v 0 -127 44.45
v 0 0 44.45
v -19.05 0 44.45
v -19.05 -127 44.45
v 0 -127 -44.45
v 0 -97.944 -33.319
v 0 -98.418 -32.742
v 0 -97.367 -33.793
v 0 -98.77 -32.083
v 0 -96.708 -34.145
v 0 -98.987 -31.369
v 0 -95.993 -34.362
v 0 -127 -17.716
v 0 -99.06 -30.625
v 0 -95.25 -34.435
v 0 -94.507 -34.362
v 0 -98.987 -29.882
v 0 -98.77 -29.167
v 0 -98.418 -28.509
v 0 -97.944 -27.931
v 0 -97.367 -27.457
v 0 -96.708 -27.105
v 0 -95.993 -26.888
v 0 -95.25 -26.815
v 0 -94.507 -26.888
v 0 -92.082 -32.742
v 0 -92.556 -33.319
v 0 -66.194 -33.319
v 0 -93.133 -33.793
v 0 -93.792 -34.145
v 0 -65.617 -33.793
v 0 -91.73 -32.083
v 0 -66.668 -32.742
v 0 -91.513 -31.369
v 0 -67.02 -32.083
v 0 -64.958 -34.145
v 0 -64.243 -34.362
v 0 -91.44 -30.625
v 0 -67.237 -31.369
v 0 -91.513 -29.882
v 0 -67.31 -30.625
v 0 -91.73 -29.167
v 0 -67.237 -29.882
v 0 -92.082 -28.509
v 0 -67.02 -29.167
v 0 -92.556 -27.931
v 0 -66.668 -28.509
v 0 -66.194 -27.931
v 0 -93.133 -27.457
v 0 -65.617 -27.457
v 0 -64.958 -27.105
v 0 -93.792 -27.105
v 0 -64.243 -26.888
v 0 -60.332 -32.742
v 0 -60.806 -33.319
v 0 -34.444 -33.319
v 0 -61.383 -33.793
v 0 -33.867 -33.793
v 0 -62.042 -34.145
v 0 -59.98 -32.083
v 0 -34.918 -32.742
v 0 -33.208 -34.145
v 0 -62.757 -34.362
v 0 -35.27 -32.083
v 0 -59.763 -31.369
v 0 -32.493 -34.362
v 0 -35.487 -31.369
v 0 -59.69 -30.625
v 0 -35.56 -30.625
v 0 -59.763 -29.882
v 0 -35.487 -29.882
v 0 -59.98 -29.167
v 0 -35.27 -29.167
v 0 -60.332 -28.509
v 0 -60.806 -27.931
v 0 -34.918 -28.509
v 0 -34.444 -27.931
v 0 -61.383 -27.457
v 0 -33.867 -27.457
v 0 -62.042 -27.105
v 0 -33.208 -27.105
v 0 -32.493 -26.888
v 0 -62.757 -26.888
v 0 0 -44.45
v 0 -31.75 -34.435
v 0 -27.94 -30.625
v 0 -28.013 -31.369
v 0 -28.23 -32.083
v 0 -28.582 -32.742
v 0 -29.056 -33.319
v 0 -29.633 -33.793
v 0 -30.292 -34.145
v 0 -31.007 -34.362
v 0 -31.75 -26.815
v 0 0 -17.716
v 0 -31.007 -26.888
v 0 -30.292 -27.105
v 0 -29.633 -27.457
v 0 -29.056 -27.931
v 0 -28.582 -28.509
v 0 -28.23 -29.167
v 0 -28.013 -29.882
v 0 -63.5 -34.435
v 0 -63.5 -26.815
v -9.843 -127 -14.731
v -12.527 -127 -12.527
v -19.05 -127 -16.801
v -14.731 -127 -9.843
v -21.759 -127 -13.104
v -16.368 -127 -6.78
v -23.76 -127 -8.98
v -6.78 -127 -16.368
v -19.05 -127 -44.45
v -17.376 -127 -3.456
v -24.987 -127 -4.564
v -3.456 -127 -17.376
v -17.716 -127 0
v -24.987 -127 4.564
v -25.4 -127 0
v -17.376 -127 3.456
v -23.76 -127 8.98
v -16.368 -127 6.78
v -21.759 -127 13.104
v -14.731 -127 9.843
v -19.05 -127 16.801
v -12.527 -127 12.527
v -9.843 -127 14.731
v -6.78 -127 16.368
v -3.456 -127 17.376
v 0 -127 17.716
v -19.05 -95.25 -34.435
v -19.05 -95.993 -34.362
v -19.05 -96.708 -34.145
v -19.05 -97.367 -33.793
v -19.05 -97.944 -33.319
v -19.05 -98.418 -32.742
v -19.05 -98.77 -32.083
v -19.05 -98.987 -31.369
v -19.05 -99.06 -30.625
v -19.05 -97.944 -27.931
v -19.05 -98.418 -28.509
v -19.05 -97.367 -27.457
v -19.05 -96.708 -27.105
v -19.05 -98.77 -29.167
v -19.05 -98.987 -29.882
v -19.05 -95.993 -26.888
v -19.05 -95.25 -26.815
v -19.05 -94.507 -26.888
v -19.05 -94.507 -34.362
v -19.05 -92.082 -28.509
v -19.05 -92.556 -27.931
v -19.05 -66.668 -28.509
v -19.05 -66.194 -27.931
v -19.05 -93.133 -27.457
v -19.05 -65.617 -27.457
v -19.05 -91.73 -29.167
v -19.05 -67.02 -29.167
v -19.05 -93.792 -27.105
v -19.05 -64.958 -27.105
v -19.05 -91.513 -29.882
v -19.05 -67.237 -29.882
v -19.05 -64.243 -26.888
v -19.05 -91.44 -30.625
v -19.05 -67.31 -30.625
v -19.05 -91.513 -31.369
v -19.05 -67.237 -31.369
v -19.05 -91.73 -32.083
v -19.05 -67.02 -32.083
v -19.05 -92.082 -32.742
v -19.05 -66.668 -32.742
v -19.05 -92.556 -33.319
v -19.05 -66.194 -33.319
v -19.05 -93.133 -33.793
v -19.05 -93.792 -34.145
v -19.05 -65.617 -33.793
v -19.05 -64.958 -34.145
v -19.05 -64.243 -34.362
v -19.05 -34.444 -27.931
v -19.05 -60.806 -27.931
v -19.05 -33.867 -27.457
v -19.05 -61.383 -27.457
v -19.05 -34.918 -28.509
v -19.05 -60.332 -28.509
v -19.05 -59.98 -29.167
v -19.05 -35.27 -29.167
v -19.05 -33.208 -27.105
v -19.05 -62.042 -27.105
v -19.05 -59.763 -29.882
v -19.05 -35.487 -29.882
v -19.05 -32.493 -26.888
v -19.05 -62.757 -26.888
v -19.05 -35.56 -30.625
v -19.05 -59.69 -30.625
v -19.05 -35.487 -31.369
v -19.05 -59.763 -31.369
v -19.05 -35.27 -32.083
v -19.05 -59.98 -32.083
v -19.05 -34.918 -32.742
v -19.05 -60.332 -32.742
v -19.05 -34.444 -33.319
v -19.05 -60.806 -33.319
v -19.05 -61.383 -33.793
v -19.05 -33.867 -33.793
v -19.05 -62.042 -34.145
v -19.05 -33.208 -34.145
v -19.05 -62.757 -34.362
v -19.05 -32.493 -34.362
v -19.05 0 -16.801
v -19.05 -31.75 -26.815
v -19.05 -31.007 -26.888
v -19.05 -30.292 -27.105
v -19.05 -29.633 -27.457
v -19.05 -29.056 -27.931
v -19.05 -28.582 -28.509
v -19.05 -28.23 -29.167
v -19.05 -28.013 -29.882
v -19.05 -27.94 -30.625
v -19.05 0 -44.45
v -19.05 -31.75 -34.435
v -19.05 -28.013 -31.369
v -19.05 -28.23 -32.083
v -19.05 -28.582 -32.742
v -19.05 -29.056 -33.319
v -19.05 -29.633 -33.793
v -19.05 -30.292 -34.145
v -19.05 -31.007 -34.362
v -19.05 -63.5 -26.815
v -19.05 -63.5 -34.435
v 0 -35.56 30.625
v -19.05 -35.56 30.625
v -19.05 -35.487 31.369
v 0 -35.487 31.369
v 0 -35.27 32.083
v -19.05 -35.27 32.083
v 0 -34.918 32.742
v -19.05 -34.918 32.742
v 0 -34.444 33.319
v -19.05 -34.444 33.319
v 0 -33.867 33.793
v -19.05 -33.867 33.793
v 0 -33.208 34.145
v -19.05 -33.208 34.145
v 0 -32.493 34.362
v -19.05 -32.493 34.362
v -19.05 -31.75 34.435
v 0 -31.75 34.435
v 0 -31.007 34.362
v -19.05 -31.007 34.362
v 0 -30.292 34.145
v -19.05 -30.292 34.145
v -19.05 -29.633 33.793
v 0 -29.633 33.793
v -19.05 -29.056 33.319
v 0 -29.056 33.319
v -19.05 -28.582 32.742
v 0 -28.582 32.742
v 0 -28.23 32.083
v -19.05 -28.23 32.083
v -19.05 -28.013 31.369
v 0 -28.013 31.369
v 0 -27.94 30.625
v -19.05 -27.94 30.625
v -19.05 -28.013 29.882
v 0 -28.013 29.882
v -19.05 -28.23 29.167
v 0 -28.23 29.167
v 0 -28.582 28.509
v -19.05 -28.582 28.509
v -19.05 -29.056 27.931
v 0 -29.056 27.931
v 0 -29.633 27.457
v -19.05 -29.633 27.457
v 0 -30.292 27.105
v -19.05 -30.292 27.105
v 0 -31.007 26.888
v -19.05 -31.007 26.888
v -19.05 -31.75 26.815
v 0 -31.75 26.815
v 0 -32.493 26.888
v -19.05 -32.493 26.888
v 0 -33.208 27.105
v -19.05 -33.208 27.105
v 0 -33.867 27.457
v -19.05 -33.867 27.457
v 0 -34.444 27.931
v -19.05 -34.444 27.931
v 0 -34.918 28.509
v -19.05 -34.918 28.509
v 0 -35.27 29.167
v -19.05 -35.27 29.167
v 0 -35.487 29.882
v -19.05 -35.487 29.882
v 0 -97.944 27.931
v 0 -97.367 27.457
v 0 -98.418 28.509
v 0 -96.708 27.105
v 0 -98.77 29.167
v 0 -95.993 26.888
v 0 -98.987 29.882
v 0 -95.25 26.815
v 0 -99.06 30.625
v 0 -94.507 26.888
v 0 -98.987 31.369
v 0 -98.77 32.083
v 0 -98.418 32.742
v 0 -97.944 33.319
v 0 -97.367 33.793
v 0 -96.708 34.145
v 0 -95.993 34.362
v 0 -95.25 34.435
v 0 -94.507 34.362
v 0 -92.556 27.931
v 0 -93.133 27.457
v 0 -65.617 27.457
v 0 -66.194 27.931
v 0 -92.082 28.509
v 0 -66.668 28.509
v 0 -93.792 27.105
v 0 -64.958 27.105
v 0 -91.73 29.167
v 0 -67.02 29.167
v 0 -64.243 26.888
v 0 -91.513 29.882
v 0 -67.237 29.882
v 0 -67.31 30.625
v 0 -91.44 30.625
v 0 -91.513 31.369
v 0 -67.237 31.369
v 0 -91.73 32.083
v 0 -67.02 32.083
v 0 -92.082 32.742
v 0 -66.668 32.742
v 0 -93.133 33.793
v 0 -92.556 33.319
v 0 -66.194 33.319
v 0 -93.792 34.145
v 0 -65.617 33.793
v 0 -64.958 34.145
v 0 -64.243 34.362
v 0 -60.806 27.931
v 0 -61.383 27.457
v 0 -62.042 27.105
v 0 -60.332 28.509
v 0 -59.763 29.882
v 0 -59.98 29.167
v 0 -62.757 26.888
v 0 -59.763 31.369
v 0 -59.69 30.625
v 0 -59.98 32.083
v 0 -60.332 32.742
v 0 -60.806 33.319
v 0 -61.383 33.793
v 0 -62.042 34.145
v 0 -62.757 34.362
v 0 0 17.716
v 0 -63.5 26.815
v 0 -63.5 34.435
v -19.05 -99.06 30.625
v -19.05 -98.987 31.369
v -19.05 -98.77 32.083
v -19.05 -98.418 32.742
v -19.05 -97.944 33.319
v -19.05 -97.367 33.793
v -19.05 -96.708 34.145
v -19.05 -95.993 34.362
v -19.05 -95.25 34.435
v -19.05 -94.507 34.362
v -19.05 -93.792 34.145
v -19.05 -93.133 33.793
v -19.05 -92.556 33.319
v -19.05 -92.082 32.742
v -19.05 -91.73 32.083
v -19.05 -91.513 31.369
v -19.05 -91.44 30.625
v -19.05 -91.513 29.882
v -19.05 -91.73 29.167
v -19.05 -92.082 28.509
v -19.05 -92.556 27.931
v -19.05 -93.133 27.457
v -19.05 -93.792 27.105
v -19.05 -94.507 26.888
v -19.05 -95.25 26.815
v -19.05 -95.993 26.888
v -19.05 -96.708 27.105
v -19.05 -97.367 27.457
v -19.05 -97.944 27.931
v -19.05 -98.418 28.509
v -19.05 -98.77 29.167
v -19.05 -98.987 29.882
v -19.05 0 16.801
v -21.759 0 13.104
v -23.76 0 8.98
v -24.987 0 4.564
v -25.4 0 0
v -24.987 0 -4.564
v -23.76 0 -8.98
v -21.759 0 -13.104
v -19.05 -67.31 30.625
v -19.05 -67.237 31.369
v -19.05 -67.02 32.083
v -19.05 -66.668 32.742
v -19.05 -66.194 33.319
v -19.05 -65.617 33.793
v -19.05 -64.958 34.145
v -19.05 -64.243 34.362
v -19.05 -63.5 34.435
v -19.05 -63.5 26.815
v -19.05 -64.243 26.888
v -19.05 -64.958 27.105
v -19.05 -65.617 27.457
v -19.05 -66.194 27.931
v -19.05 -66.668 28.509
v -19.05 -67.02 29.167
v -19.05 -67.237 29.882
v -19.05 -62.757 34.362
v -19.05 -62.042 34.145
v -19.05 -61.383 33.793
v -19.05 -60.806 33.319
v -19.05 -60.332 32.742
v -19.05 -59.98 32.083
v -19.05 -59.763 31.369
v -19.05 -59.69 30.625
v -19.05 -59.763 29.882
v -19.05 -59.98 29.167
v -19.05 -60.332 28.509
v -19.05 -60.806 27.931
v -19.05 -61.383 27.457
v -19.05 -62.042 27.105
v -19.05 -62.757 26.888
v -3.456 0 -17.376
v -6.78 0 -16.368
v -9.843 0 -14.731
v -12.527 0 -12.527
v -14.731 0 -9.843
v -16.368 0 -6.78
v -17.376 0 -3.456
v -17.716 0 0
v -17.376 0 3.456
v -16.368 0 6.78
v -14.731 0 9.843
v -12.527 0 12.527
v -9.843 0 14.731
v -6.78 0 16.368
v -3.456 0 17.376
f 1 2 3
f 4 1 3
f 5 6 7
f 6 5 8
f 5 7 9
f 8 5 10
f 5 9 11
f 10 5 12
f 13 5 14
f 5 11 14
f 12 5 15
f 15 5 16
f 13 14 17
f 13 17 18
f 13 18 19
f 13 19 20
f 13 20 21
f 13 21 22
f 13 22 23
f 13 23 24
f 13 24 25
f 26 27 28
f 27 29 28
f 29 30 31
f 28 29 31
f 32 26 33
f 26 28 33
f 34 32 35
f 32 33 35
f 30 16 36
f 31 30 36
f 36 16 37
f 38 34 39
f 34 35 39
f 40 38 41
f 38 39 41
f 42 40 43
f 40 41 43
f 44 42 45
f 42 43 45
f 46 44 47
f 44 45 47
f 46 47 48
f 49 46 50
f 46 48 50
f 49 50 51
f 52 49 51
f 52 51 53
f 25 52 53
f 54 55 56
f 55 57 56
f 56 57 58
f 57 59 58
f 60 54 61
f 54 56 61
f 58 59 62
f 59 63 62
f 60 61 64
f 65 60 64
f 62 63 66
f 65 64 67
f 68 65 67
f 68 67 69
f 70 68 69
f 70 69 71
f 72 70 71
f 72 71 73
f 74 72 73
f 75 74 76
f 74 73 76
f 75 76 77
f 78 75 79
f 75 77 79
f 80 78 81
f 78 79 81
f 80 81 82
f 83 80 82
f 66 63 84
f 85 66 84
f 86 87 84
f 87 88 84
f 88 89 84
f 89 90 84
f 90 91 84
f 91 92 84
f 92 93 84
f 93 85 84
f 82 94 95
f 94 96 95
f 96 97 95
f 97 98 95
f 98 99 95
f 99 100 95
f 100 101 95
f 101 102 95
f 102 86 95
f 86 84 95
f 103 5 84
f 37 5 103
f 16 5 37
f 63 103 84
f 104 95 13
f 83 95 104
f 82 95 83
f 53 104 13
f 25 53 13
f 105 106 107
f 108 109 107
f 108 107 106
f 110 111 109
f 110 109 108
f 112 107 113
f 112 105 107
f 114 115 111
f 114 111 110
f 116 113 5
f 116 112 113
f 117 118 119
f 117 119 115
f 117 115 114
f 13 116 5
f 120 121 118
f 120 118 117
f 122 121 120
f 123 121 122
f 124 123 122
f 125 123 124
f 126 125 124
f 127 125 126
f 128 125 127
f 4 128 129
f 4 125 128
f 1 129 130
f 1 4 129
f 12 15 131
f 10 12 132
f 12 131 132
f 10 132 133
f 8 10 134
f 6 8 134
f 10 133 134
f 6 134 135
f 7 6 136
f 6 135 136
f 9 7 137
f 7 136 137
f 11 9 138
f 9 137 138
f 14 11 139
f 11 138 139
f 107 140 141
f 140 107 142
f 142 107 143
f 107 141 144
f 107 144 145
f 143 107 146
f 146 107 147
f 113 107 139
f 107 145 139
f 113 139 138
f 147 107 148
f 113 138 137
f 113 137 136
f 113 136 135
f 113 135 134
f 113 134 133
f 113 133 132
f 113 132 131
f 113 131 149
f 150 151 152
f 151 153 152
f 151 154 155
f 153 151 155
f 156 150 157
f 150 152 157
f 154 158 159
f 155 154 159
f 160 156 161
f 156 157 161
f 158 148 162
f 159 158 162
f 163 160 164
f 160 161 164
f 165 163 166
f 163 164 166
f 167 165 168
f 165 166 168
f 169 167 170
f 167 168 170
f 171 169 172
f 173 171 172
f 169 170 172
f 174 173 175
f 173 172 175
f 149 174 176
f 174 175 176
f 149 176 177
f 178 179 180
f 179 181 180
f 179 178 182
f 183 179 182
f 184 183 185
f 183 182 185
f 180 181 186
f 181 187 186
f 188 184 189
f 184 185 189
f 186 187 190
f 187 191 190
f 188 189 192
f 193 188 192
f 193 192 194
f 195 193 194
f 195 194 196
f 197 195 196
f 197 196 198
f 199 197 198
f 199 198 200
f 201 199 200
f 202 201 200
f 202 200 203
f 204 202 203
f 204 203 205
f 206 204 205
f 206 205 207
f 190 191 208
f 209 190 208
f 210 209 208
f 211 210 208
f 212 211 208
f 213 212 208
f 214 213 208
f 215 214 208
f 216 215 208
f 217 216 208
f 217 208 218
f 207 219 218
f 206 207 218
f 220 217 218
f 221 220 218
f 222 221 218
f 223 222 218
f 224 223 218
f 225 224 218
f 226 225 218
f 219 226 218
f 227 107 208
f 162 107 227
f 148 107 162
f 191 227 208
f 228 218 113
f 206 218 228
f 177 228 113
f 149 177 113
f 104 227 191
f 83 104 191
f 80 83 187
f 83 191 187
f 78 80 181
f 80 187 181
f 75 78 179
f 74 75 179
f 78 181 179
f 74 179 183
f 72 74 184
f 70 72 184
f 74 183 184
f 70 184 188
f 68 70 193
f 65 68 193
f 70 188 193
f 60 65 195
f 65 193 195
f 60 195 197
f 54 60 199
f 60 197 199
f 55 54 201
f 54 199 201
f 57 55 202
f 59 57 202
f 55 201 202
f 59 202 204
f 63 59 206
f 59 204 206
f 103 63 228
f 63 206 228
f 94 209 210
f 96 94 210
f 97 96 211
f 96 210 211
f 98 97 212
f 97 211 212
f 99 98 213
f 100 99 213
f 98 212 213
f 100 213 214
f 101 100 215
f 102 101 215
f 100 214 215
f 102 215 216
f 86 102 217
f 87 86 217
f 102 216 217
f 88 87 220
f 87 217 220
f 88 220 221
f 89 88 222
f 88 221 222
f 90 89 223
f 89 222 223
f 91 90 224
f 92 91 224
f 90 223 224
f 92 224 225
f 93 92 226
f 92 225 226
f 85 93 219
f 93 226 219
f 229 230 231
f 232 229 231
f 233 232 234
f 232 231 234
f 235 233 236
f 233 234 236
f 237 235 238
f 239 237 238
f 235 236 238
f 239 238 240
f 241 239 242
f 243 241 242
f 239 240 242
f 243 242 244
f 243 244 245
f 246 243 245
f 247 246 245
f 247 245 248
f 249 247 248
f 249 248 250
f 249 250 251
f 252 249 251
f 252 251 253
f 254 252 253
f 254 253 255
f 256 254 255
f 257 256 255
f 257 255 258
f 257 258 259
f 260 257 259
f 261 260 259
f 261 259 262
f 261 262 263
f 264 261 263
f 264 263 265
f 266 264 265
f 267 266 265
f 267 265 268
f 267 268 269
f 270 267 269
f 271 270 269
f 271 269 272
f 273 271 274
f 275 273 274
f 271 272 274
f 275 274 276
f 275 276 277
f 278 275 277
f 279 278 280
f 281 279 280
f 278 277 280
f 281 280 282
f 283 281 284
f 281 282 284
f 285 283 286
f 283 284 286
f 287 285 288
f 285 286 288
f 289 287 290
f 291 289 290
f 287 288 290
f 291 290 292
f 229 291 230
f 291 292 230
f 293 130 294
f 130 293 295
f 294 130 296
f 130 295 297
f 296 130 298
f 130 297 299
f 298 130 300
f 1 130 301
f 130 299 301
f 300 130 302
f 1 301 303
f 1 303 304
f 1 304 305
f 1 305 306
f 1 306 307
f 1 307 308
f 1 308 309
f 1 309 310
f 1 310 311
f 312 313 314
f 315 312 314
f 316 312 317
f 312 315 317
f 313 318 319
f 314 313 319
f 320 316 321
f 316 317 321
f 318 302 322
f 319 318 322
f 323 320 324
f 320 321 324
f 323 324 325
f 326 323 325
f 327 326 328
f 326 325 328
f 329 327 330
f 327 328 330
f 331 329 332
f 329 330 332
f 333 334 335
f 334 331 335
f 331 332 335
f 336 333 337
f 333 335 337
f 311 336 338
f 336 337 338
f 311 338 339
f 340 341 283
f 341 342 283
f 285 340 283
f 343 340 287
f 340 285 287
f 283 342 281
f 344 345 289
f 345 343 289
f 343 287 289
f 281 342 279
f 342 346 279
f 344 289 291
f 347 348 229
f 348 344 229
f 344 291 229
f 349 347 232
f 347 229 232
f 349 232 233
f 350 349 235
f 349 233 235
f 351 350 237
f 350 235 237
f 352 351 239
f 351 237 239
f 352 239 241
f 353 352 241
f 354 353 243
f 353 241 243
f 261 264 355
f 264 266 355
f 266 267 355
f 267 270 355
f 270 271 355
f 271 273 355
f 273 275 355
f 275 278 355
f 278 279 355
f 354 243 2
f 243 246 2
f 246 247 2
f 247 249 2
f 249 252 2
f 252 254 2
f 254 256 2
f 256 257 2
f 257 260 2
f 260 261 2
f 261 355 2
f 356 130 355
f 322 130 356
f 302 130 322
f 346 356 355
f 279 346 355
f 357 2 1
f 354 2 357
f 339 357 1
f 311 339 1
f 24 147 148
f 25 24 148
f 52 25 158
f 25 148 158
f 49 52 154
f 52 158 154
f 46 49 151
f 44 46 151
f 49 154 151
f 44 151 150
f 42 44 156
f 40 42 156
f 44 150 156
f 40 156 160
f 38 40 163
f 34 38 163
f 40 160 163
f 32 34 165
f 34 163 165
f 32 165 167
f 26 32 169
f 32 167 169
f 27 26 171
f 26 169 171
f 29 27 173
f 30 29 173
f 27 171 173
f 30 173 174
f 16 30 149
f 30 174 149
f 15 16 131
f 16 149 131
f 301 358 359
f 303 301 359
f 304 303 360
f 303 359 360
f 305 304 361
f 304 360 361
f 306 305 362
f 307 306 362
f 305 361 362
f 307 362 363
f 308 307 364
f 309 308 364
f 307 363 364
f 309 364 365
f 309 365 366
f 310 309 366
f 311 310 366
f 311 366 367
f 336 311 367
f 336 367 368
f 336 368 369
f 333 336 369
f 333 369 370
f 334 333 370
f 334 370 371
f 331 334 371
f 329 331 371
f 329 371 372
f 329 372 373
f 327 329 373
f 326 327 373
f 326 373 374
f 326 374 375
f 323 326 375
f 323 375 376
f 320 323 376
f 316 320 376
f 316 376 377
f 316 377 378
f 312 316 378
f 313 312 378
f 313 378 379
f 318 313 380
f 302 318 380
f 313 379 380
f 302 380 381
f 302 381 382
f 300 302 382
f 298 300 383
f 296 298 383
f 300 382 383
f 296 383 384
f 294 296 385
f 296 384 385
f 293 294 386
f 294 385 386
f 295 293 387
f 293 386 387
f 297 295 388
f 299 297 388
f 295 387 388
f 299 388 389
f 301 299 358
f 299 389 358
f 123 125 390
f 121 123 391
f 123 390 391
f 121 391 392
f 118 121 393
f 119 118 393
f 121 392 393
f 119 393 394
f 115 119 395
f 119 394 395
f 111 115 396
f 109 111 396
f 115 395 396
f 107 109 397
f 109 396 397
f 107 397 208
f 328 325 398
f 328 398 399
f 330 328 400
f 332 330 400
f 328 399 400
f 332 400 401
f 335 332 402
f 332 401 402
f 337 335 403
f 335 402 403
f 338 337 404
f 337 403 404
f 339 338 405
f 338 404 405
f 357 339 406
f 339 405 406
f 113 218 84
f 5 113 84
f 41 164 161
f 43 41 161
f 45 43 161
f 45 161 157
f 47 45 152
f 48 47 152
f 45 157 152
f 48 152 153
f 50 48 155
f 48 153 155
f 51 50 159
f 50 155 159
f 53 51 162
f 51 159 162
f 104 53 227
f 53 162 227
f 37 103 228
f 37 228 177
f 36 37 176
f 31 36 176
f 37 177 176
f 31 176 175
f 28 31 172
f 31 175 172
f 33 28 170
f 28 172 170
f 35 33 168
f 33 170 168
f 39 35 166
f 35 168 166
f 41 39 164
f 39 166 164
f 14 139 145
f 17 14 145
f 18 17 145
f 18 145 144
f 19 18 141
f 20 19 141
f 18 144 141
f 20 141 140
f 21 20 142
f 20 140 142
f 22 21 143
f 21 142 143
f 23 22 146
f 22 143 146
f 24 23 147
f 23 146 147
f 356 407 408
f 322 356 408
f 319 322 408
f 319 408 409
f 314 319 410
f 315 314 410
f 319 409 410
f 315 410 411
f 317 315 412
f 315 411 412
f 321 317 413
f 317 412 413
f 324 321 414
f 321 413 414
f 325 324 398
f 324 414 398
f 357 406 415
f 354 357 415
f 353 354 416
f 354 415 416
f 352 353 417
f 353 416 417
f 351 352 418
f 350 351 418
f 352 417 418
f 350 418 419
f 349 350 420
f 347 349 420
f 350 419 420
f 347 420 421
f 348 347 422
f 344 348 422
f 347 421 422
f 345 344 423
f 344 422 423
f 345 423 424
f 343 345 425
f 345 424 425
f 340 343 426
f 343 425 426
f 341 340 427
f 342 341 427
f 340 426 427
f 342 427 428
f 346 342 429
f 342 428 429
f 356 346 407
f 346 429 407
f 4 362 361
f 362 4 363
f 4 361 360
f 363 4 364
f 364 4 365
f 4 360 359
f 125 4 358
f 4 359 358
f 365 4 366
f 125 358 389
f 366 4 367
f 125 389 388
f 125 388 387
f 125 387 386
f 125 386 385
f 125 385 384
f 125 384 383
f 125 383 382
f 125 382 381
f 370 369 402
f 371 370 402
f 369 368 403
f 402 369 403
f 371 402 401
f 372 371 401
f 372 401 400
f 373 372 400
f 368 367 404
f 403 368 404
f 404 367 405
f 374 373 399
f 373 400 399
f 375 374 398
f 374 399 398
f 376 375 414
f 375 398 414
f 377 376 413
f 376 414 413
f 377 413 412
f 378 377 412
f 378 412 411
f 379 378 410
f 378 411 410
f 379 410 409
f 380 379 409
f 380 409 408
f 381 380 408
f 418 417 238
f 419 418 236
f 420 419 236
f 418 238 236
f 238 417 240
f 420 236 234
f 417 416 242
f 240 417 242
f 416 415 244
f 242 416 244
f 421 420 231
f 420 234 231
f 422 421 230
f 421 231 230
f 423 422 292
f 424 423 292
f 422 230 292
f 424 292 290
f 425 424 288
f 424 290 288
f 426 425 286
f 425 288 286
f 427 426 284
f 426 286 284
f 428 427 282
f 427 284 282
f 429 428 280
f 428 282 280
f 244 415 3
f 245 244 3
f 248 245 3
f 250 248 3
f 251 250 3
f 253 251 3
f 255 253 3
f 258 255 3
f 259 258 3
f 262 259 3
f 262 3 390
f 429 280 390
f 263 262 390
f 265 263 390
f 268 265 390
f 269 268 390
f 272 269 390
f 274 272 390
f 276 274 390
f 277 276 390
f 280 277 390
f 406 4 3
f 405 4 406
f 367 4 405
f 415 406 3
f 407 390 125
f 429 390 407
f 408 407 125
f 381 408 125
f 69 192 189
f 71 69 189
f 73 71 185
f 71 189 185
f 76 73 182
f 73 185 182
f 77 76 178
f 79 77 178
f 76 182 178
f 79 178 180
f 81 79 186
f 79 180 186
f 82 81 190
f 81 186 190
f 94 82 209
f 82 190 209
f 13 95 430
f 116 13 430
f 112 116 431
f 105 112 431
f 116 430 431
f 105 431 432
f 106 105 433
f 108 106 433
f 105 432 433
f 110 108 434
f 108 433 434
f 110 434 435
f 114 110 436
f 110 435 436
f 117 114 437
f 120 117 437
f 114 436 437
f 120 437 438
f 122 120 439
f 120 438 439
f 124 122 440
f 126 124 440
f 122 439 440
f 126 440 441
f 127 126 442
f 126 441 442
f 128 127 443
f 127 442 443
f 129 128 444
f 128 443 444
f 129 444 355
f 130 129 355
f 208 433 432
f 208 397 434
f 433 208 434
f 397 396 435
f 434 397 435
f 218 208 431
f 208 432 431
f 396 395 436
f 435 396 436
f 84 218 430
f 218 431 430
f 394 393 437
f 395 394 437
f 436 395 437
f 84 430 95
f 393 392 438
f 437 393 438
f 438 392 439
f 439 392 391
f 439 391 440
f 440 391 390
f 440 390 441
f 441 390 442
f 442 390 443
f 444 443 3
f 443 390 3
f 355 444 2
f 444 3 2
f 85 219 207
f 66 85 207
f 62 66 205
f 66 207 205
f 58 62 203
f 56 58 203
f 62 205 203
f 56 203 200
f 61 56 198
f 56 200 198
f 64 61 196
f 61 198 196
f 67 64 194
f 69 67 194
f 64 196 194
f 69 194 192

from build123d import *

# Parameters (mm, degrees)
F1_DEPTH = 127
F3_DEPTH = 25.4
F4_R     = 3.81
F5_DEPTH = 25.4


with BuildPart() as f1:
    # F0 (on Front) → F1 (new body)
    with BuildSketch(Plane.XZ):
        with BuildLine():
            Line((-19.05, 44.45), (-19.05, 16.800521))
            ThreePointArc((-19.05, 16.800521), (-25.4, 0), (-19.05, -16.800521))
            Line((-19.05, -16.800521), (-19.05, -44.45))
            Line((-19.05, -44.45), (0, -44.45))
            Line((0, -44.45), (0, -17.7165))
            ThreePointArc((0, -17.7165), (-17.7165, 0), (0, 17.7165))
            Line((0, 17.7165), (0, 44.45))
            Line((0, 44.45), (-19.05, 44.45))
        make_face()
    extrude(amount=F1_DEPTH)

    # F2 (on face) → F3 (cut)
    with BuildSketch(Plane(origin=(-19.05, 0, 0), x_dir=(0, -1, 0), z_dir=(-1, 0, 0))):
        with BuildLine():
            ThreePointArc((67.31, -30.62526), (66.194077, -27.931184), (63.5, -26.81526))
            Line((63.5, -26.81526), (63.5, -34.43526))
            ThreePointArc((63.5, -34.43526), (66.194077, -33.319337), (67.31, -30.62526))
        make_face()
        with BuildLine():
            Line((63.5, -34.43526), (63.5, -26.81526))
            ThreePointArc((63.5, -26.81526), (59.69, -30.62526), (63.5, -34.43526))
        make_face()
        with BuildLine():
            ThreePointArc((35.56, -30.62526), (34.444077, -27.931184), (31.75, -26.81526))
            Line((31.75, -26.81526), (31.75, -34.43526))
            ThreePointArc((31.75, -34.43526), (34.444077, -33.319337), (35.56, -30.62526))
        make_face()
        with BuildLine():
            Line((31.75, -34.43526), (31.75, -26.81526))
            ThreePointArc((31.75, -26.81526), (27.94, -30.62526), (31.75, -34.43526))
        make_face()
        with BuildLine():
            ThreePointArc((95.25, -34.43526), (97.944077, -33.319337), (99.06, -30.62526))
            ThreePointArc((99.06, -30.62526), (97.944077, -27.931184), (95.25, -26.81526))
            Line((95.25, -26.81526), (95.25, -34.43526))
        make_face()
        with BuildLine():
            Line((95.25, -34.43526), (95.25, -26.81526))
            ThreePointArc((95.25, -26.81526), (91.44, -30.62526), (95.25, -34.43526))
        make_face()
    extrude(amount=-F3_DEPTH, mode=Mode.SUBTRACT)

    # F4 (on face) → F5 (cut)
    with BuildSketch(Plane(origin=(-19.05, 0, 0), x_dir=(0, -1, 0), z_dir=(-1, 0, 0))):
        with BuildLine():
            ThreePointArc((63.5, 26.81526), (66.194077, 27.931184), (67.31, 30.62526))
            ThreePointArc((67.31, 30.62526), (66.194077, 33.319337), (63.5, 34.43526))
            Line((63.5, 34.43526), (63.5, 26.81526))
        make_face()
        with BuildLine():
            Line((63.5, 26.81526), (63.5, 34.43526))
            ThreePointArc((63.5, 34.43526), (59.69, 30.62526), (63.5, 26.81526))
        make_face()
        with Locations((31.75, 30.62526)):
            Circle(F4_R)
        with Locations((95.25, 30.62526)):
            Circle(F4_R)
    extrude(amount=-F5_DEPTH, mode=Mode.SUBTRACT)


solid = f1.part
